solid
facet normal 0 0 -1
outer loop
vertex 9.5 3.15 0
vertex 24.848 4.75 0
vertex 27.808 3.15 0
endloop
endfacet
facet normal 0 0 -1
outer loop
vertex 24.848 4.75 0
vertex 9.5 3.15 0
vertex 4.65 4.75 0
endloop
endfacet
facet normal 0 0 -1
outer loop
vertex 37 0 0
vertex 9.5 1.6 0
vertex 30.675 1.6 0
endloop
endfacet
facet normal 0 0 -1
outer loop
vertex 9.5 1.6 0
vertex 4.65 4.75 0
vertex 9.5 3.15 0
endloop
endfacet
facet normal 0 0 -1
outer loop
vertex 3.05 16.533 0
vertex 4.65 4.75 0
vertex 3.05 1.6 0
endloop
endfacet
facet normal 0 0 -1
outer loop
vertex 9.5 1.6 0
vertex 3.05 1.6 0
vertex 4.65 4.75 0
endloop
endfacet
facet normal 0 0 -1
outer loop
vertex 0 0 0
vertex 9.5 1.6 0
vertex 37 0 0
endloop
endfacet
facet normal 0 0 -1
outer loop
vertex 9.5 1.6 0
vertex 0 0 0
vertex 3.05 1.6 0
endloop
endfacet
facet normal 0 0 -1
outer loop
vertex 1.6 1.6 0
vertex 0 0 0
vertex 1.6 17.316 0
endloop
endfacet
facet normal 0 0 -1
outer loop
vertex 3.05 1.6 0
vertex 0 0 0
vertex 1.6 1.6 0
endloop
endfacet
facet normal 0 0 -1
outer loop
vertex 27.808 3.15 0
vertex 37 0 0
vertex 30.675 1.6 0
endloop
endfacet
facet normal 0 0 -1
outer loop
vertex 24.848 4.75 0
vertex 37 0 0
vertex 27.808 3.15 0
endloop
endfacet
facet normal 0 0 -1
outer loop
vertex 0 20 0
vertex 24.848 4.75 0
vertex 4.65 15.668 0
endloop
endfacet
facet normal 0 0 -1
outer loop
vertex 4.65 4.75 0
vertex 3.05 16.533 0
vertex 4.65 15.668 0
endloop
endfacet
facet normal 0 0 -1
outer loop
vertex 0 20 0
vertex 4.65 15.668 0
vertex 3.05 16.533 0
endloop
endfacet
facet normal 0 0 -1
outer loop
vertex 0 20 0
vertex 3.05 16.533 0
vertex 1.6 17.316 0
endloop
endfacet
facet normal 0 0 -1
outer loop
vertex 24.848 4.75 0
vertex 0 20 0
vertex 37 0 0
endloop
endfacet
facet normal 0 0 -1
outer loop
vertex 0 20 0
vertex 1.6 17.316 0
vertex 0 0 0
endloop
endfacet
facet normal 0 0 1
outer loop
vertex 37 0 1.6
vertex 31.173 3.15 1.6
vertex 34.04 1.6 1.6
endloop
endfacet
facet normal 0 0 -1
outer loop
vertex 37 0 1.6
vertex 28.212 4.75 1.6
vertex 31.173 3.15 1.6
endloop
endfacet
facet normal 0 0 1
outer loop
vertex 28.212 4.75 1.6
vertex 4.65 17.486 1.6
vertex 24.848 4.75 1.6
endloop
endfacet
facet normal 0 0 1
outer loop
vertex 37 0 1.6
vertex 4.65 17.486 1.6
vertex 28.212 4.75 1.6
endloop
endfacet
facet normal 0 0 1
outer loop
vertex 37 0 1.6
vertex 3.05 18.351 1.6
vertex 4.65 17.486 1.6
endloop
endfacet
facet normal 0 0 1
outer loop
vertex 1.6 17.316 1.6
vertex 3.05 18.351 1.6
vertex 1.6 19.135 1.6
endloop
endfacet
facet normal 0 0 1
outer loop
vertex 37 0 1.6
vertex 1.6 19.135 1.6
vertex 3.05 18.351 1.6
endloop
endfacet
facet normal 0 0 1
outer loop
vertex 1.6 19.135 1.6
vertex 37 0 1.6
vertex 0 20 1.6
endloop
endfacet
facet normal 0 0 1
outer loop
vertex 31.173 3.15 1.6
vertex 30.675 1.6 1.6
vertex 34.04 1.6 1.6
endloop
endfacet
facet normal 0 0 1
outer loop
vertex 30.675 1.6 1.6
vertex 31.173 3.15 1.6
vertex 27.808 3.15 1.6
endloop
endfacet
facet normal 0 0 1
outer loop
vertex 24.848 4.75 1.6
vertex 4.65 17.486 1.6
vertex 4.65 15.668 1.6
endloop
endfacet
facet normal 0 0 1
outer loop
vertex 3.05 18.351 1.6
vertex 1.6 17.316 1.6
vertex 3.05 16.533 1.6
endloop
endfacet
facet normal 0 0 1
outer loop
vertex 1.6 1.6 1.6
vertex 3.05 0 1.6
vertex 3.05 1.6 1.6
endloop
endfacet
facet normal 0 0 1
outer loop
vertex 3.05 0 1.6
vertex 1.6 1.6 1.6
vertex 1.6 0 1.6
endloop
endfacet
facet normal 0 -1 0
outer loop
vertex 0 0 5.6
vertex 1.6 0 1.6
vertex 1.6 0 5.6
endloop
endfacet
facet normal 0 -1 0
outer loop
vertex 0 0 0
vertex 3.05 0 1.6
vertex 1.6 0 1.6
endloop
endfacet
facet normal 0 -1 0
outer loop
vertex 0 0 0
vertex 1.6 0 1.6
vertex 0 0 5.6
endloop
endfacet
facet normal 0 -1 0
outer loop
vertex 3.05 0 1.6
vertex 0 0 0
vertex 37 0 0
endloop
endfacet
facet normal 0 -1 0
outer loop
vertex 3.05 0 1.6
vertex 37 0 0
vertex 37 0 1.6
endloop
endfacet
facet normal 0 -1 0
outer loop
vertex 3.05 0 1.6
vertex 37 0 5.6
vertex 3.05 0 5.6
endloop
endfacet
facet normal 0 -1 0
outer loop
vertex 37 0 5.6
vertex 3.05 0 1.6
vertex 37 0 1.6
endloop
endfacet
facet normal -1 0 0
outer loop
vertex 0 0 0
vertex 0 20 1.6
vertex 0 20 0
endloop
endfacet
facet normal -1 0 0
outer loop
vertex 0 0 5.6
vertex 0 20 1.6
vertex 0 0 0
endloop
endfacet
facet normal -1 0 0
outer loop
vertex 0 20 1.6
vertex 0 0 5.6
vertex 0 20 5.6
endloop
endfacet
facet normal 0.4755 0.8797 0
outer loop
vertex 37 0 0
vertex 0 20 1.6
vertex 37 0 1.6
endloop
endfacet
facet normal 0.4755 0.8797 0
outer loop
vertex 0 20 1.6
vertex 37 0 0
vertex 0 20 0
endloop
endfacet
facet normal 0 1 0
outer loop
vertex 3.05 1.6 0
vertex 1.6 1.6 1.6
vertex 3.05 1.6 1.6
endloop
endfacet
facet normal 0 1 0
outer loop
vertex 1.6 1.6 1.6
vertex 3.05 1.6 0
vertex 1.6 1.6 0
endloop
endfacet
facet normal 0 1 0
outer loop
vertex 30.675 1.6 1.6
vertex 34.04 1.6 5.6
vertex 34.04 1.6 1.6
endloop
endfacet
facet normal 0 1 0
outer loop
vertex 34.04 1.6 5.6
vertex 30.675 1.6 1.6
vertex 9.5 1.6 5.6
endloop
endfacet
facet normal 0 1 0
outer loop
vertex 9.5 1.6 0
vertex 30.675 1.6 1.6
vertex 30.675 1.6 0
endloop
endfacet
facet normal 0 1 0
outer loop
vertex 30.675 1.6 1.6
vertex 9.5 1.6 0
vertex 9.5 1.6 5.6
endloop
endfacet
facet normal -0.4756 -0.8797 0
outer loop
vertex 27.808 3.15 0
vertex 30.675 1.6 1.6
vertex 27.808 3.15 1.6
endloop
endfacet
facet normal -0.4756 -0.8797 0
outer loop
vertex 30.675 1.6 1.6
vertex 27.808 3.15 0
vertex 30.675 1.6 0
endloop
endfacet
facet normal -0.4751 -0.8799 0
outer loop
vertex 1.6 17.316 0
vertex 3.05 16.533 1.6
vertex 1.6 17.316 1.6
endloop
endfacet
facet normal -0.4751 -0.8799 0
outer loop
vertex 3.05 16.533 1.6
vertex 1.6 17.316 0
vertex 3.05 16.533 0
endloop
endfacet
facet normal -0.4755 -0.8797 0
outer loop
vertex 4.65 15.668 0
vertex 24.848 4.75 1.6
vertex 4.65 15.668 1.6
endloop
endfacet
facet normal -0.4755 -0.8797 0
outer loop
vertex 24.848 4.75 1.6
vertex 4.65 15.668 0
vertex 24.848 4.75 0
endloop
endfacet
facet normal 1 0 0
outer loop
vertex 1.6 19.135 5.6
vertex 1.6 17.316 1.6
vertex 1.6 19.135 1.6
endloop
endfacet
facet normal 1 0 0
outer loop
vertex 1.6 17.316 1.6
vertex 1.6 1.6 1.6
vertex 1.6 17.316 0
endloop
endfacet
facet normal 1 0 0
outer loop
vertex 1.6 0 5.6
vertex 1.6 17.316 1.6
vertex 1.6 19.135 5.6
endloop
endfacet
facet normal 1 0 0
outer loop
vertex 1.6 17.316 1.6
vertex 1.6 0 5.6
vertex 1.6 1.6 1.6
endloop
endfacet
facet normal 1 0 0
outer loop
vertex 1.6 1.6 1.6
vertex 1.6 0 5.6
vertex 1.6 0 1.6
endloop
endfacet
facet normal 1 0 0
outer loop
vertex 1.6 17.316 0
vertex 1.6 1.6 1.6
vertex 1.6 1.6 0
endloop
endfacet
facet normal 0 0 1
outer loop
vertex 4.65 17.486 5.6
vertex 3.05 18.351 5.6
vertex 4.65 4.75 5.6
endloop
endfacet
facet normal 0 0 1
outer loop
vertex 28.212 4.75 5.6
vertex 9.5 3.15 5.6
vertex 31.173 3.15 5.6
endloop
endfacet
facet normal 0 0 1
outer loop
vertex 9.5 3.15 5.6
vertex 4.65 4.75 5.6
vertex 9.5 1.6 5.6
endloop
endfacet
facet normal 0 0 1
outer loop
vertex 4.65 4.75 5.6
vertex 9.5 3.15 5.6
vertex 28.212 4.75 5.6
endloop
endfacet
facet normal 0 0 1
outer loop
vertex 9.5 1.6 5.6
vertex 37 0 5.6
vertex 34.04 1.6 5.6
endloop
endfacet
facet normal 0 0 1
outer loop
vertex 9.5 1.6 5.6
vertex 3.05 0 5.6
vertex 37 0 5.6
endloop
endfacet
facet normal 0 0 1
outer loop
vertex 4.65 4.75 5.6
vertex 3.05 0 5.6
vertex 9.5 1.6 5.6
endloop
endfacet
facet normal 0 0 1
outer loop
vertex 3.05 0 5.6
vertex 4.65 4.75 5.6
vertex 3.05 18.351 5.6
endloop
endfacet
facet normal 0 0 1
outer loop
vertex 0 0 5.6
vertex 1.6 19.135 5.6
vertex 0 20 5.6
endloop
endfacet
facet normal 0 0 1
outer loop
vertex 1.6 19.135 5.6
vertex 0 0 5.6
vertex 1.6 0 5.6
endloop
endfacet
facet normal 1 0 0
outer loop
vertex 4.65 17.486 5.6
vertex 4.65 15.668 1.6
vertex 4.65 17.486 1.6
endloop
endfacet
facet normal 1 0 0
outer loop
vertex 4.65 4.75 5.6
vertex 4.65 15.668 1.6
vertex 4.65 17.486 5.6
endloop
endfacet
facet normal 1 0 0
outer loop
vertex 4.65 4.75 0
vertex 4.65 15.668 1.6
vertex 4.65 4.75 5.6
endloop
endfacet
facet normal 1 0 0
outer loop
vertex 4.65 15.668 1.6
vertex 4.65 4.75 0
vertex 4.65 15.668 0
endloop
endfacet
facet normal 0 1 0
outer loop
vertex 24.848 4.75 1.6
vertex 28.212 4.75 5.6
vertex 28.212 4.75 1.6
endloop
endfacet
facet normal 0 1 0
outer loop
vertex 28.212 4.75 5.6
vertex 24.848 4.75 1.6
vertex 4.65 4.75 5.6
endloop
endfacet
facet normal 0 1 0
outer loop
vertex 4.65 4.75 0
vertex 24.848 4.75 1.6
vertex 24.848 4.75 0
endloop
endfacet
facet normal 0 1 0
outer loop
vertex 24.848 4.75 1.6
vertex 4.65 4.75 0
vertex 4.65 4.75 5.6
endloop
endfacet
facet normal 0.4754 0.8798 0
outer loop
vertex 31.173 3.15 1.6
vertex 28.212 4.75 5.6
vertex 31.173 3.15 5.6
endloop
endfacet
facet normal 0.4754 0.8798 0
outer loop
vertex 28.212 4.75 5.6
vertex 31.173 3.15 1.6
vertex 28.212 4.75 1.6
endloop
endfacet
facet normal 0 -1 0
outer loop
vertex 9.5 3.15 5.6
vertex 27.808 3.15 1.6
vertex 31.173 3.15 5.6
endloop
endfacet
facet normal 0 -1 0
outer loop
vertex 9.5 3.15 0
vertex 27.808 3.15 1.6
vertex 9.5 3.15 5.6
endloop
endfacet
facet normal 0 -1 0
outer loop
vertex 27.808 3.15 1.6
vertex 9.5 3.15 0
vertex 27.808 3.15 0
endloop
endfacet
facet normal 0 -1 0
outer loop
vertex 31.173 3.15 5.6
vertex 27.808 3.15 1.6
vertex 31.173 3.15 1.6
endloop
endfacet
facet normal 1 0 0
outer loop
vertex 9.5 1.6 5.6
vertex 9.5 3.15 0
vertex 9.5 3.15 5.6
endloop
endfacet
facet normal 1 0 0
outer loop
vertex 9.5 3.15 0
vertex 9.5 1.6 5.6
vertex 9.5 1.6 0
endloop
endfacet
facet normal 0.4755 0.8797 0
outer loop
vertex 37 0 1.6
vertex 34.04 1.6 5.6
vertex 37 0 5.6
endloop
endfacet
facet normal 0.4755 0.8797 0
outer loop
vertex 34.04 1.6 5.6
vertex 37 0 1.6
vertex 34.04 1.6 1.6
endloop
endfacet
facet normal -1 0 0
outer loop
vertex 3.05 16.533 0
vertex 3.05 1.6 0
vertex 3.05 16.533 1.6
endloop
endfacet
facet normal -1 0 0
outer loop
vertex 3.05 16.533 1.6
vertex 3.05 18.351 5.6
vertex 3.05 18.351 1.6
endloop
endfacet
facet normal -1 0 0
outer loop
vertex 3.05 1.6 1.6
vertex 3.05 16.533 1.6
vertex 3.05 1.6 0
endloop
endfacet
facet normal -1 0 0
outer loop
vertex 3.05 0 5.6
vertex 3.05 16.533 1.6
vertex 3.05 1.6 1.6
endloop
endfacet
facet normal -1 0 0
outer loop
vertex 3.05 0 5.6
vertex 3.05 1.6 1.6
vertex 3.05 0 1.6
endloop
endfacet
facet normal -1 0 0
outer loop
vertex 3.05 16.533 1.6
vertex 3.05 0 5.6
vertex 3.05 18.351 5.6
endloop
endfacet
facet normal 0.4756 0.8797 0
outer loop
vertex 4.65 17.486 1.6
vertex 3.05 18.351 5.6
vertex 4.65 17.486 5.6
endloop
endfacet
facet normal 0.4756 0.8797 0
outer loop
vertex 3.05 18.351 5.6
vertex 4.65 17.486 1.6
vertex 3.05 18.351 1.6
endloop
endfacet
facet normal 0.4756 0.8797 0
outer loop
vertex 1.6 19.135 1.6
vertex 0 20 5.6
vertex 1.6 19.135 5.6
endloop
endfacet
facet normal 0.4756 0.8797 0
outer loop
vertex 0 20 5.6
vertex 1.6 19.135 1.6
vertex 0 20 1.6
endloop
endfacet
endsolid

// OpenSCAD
proto_thickness = 1.55;
board_thickness = 1.45;
height_gap = 6.45;
groove = 4;
wall = 1.6;
length = 20;
height = 37;

scaled_height = height - wall * ((height + sqrt(height * height + length * length)) / length);
scaled_length = length - wall * ((length + sqrt(height * height + length * length)) / height);

rotate([0, 180, -90]) mirror([0, 0, -1]) {

linear_extrude(height = wall) {
  difference() {
    polygon([[0, 0], [length, 0], [0, height]]);
    polygon([
      [wall, wall],
      [scaled_length, wall],
      [wall, scaled_height]
    ]);
  }
}

linear_extrude(height = wall + groove) {
  difference() {
    polygon([
      [0, 0],
      [0, height],
      [2 * wall + proto_thickness, -(height / length) * (2 * wall + proto_thickness) + height],
      [2 * wall + proto_thickness, 2 * wall + board_thickness],
      [((2 * wall + board_thickness) - height) * -(length / height), 2 * wall + board_thickness],
      [length, 0]
    ]);
    translate([wall, height_gap + wall + board_thickness]) {
      square([proto_thickness, height - height_gap - wall - board_thickness]);
    }
    translate([0, wall]) {
      square([length, board_thickness]);
    }
  }
}

}
  
  
  
  
  
  
  
  
  
  
  
  
  
  
  
  
  
  
  
